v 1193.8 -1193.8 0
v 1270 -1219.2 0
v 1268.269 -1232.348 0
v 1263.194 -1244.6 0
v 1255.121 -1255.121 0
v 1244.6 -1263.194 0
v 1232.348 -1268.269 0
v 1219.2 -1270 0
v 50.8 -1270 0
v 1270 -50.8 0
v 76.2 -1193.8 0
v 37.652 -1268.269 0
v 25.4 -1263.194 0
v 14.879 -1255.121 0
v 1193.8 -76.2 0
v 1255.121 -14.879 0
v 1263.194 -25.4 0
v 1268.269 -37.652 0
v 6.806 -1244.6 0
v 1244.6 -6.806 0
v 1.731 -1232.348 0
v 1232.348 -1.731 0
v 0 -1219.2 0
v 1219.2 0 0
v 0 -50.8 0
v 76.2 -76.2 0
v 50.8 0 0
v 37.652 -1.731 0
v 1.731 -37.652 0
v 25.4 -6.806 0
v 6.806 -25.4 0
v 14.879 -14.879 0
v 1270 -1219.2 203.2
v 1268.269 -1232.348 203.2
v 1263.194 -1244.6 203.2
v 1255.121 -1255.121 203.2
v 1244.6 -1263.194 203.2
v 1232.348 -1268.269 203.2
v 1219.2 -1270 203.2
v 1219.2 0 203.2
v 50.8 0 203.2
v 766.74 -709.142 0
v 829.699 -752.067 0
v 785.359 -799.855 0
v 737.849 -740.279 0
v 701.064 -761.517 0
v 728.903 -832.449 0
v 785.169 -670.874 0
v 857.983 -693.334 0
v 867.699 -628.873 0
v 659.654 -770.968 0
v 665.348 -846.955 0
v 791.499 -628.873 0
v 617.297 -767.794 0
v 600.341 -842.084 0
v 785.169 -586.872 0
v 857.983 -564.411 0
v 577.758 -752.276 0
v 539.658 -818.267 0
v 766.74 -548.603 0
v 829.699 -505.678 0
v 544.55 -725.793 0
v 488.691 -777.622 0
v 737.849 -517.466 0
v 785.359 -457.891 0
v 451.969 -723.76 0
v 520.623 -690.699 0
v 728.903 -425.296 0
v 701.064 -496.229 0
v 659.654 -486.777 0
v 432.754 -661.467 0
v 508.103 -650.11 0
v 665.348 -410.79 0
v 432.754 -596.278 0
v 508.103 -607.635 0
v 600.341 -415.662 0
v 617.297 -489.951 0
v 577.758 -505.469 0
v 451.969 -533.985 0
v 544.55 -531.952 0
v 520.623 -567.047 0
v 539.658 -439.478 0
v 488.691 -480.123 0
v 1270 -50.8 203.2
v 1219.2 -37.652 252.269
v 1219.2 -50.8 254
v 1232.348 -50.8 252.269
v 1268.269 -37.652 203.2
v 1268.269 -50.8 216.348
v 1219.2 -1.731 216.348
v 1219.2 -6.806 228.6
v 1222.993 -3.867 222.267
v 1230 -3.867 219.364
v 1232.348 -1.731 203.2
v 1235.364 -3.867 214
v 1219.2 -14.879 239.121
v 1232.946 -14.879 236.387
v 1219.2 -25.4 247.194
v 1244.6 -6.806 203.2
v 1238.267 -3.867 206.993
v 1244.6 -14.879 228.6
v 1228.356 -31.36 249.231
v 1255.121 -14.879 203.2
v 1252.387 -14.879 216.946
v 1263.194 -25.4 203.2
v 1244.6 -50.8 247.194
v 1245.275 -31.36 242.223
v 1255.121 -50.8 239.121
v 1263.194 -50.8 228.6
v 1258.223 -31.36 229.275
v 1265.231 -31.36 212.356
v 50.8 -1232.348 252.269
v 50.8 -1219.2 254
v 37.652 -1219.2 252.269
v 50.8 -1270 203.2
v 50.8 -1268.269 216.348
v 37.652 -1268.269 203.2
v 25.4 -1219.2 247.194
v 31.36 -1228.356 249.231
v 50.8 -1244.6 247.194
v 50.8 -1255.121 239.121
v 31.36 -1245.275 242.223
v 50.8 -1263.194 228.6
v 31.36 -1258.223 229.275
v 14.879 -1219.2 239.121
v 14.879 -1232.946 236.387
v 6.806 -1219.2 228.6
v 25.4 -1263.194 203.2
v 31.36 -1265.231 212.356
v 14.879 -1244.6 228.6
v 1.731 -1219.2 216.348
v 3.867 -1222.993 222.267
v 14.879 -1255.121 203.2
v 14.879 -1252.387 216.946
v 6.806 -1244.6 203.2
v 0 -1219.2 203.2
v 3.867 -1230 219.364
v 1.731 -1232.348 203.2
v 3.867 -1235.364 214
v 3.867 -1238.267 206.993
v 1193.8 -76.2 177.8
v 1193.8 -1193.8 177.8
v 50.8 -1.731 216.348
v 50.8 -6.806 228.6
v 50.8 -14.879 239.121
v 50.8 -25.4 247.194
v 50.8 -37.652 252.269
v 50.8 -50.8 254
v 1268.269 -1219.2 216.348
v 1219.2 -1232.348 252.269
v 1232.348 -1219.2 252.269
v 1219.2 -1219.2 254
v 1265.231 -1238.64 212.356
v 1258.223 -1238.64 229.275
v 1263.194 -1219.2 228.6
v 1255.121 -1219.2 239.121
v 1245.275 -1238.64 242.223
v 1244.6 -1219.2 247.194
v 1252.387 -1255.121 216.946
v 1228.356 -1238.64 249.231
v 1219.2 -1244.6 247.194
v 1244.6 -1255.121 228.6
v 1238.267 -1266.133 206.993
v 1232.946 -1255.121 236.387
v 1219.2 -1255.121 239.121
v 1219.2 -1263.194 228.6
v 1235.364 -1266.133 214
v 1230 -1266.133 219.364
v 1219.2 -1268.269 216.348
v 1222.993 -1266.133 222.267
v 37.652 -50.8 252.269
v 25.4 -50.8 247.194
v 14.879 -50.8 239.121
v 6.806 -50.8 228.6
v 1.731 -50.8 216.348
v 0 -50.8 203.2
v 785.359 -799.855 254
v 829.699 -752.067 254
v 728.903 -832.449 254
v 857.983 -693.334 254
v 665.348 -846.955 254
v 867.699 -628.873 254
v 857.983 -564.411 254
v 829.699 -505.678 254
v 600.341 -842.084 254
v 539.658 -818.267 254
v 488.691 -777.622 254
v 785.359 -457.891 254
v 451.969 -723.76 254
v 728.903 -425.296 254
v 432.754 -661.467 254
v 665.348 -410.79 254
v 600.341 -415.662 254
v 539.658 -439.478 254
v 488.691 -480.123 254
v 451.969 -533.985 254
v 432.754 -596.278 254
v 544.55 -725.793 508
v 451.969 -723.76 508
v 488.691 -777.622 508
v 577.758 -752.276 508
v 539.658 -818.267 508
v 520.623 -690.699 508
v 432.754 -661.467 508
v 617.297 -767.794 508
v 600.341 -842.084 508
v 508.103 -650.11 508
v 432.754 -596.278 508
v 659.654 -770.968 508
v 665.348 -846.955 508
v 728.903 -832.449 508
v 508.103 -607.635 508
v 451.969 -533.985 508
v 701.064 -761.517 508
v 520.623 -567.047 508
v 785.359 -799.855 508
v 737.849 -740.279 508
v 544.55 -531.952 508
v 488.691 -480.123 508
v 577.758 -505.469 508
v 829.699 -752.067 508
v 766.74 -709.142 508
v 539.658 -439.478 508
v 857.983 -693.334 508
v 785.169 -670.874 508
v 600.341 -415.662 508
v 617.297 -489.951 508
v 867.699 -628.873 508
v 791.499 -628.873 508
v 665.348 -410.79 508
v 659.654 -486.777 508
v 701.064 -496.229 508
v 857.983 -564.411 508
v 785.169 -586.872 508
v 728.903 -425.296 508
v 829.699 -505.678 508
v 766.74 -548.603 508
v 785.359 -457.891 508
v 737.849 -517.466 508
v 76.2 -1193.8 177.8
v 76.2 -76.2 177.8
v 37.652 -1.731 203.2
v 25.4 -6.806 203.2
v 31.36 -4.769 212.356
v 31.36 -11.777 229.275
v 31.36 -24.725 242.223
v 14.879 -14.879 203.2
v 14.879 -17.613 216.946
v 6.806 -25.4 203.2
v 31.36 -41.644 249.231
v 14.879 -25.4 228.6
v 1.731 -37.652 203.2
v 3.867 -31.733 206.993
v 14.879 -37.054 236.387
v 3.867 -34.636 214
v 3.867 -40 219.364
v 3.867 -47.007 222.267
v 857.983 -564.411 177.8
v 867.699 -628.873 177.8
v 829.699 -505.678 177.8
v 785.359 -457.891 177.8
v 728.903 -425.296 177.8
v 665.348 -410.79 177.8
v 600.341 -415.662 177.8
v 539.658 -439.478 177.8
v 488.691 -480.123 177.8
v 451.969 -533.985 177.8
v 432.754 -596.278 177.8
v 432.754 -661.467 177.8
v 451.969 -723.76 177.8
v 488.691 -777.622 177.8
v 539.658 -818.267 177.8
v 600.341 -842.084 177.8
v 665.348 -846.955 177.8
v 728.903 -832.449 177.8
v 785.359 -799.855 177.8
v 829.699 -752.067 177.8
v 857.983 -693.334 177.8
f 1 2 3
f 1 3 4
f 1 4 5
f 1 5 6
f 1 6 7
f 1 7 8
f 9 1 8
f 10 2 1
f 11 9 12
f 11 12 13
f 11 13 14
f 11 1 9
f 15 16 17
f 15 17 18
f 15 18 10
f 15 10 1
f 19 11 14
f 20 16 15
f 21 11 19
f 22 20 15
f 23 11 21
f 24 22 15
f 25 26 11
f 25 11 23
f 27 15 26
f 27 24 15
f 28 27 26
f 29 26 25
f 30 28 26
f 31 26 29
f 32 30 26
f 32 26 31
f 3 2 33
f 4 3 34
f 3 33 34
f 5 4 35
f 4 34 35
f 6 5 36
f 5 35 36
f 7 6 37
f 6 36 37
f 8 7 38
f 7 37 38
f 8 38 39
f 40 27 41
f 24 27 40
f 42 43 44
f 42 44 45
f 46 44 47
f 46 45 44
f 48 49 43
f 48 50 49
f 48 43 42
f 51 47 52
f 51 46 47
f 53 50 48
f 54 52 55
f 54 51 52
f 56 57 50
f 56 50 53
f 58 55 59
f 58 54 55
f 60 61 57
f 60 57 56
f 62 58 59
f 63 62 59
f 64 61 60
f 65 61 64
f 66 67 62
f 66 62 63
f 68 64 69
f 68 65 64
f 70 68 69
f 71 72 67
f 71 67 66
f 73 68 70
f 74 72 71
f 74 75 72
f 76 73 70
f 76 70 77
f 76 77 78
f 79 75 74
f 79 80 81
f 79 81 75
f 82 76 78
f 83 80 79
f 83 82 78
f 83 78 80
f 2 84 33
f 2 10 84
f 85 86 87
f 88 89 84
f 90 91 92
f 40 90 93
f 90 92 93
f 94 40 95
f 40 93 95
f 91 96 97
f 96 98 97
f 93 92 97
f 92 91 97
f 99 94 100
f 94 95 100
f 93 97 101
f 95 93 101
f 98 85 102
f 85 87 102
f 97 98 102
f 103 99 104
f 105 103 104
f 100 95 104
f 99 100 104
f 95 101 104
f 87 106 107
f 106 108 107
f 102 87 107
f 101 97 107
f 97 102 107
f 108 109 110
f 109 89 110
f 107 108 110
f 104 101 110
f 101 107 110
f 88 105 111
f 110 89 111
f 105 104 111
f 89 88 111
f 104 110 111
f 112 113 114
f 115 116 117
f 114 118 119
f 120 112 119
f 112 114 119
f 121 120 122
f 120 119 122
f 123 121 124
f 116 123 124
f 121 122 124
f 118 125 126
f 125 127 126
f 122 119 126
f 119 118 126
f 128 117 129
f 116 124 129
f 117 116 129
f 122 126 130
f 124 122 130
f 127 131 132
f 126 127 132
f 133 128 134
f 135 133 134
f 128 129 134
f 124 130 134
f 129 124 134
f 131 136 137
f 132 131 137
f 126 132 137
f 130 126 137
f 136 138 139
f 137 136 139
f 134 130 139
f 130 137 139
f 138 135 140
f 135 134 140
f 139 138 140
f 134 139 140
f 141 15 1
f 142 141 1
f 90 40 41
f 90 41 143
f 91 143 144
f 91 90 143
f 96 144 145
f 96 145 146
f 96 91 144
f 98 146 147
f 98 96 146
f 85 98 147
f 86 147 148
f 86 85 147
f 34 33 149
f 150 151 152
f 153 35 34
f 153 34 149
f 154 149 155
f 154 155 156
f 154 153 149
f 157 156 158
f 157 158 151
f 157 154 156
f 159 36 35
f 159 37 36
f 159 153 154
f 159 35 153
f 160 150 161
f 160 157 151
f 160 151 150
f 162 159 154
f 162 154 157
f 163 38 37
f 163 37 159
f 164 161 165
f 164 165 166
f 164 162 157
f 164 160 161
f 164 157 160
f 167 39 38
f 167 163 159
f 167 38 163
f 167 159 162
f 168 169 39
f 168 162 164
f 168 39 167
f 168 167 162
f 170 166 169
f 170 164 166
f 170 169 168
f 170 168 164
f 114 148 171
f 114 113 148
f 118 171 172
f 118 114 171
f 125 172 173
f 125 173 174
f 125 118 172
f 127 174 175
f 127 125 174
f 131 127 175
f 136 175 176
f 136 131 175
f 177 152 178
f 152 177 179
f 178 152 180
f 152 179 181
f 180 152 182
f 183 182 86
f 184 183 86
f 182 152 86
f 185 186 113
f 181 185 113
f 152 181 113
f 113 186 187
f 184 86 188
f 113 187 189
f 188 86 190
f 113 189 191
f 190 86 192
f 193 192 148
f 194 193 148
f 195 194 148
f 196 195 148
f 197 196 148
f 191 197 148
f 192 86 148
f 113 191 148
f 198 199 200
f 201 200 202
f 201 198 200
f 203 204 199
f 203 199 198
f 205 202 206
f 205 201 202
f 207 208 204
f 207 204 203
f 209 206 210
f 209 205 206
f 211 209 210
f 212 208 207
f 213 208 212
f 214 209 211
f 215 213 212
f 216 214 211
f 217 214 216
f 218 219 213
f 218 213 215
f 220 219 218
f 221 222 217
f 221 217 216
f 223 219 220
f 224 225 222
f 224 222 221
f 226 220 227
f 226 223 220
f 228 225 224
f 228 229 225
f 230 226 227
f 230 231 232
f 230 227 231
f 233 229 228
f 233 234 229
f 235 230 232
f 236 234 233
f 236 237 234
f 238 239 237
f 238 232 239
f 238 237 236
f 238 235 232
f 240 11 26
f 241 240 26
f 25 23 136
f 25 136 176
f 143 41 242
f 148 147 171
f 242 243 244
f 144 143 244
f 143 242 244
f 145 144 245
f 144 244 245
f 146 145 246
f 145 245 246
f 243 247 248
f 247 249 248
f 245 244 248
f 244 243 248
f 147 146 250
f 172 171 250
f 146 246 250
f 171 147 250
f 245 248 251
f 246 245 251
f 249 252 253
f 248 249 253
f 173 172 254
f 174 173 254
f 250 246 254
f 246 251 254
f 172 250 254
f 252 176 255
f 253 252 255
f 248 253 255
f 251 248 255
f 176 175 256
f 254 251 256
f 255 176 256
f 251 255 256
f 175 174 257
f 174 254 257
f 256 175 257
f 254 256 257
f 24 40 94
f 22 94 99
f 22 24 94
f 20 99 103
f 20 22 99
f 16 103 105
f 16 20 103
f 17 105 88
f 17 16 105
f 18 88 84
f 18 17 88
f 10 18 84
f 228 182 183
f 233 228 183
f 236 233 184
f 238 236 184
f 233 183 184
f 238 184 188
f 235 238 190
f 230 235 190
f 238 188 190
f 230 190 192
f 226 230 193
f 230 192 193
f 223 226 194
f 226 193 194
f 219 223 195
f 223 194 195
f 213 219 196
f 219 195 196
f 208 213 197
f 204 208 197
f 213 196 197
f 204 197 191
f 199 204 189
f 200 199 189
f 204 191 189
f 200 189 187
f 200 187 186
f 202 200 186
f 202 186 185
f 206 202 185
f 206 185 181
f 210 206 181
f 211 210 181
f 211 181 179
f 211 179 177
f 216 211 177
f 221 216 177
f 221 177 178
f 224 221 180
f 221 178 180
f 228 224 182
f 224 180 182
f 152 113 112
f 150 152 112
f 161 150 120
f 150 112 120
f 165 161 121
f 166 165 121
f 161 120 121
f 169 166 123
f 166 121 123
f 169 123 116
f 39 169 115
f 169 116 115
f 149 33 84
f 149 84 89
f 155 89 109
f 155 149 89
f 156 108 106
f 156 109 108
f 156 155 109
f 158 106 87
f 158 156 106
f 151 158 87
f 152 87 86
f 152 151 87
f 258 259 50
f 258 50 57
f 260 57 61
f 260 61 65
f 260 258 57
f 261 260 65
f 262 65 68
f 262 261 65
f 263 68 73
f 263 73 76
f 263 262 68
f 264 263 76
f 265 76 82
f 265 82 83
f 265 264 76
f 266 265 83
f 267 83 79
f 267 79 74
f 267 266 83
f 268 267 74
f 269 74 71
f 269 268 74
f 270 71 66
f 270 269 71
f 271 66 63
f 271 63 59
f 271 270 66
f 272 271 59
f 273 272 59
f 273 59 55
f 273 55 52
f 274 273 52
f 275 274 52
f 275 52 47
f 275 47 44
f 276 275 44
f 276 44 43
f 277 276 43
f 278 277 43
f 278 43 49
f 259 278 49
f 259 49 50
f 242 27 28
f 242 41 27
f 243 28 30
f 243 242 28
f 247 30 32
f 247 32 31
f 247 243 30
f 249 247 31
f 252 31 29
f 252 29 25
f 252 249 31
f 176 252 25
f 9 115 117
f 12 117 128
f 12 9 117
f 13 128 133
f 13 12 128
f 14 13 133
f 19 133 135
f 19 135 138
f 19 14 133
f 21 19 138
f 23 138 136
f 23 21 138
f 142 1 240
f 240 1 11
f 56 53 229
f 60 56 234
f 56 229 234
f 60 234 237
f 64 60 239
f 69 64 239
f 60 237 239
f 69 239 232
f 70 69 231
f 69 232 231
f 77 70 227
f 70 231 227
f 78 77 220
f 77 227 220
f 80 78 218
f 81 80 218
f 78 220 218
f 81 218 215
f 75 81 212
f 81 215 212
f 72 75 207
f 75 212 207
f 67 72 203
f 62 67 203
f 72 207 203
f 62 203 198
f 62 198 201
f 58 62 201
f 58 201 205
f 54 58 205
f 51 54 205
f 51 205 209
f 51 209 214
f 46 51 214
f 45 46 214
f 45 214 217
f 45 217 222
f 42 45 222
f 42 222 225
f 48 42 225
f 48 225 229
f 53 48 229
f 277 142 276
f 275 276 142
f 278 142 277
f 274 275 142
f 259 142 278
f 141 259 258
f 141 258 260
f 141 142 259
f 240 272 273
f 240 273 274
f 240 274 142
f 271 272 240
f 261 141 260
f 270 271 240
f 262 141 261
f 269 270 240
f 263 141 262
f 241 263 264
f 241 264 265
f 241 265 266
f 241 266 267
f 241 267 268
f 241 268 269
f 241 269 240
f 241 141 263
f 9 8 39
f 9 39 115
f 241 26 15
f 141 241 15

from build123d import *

# Parameters (mm, degrees)
BOSS_EXTRUDE1_DEPTH = 254
SKETCH2_R           = 218.69407086262316
BOSS_EXTRUDE2_DEPTH = 254
FILLET2_R           = 50.8
FILLET3_R           = 50.8
FILLET4_R           = 50.8
FILLET5_R           = 50.8
SKETCH4_R           = 142.49407086262323
CUT_EXTRUDE13_DEPTH = 1867.5111840007871
SHELL4_T            = -76.2


with BuildPart() as part:
    # Sketch1 → Boss-Extrude1 (new body)
    with BuildSketch(Plane.XY):
        Polygon((0, 0), (1270, 0), (1270.0000000000002, -1270), (1.5553e-13, -1270), align=None)
    extrude(amount=BOSS_EXTRUDE1_DEPTH)

    # Sketch2 → Boss-Extrude2 (add)
    with BuildSketch(Plane(origin=(15.756060209551226, -33.262793775725605, 254.0000000000191), x_dir=(1, 0, 0), z_dir=(0, 0, 1))):
        with Locations((633.2493266433831, -595.6098494761216)):
            Circle(SKETCH2_R)
    extrude(amount=BOSS_EXTRUDE2_DEPTH)

    # Fillet2
    fillet2_edges = [part.edges().sort_by_distance(p)[0] for p in [
        (1270, -635, 254),
    ]]
    fillet(fillet2_edges, radius=FILLET2_R)

    # Fillet3
    fillet3_edges = [part.edges().sort_by_distance(p)[0] for p in [
        (609.6, 0, 254),
        (1270, 0, 101.60000000000001),
        (1255.1210244842766, 6.43e-15, 239.12102448427663),
    ]]
    fillet(fillet3_edges, radius=FILLET3_R)

    # Fillet4
    fillet4_edges = [part.edges().sort_by_distance(p)[0] for p in [
        (1270.0000000000002, -1270, 101.60000000000001),
        (1255.1210244842769, -1270, 239.12102448427663),
        (609.6000000000003, -1270, 254),
    ]]
    fillet(fillet4_edges, radius=FILLET4_R)

    # Fillet5
    fillet5_edges = [part.edges().sort_by_distance(p)[0] for p in [
        (0, 0, 101.60000000000001),
        (7.777e-14, -635, 254),
        (6.22e-15, -14.878975515723361, 239.12102448427663),
        (1.5553e-13, -1270, 101.60000000000001),
        (2.2737e-13, -1255.1210244842766, 239.12102448427663),
    ]]
    fillet(fillet5_edges, radius=FILLET5_R)

    # Sketch4 → Cut-Extrude13 (cut, through all)
    with BuildSketch(Plane.XY.offset(508.0000000000191)):
        with Locations((649.0053868529344, -628.8726432518471)):
            Circle(SKETCH4_R)
    extrude(amount=-CUT_EXTRUDE13_DEPTH, mode=Mode.SUBTRACT)

    # Shell4
    shell4_openings = [part.faces().sort_by_distance(p)[0] for p in [
        (635, -1252.039487758, 0),
    ]]
    offset(amount=SHELL4_T, openings=shell4_openings, kind=Kind.INTERSECTION)


solid = part.part
